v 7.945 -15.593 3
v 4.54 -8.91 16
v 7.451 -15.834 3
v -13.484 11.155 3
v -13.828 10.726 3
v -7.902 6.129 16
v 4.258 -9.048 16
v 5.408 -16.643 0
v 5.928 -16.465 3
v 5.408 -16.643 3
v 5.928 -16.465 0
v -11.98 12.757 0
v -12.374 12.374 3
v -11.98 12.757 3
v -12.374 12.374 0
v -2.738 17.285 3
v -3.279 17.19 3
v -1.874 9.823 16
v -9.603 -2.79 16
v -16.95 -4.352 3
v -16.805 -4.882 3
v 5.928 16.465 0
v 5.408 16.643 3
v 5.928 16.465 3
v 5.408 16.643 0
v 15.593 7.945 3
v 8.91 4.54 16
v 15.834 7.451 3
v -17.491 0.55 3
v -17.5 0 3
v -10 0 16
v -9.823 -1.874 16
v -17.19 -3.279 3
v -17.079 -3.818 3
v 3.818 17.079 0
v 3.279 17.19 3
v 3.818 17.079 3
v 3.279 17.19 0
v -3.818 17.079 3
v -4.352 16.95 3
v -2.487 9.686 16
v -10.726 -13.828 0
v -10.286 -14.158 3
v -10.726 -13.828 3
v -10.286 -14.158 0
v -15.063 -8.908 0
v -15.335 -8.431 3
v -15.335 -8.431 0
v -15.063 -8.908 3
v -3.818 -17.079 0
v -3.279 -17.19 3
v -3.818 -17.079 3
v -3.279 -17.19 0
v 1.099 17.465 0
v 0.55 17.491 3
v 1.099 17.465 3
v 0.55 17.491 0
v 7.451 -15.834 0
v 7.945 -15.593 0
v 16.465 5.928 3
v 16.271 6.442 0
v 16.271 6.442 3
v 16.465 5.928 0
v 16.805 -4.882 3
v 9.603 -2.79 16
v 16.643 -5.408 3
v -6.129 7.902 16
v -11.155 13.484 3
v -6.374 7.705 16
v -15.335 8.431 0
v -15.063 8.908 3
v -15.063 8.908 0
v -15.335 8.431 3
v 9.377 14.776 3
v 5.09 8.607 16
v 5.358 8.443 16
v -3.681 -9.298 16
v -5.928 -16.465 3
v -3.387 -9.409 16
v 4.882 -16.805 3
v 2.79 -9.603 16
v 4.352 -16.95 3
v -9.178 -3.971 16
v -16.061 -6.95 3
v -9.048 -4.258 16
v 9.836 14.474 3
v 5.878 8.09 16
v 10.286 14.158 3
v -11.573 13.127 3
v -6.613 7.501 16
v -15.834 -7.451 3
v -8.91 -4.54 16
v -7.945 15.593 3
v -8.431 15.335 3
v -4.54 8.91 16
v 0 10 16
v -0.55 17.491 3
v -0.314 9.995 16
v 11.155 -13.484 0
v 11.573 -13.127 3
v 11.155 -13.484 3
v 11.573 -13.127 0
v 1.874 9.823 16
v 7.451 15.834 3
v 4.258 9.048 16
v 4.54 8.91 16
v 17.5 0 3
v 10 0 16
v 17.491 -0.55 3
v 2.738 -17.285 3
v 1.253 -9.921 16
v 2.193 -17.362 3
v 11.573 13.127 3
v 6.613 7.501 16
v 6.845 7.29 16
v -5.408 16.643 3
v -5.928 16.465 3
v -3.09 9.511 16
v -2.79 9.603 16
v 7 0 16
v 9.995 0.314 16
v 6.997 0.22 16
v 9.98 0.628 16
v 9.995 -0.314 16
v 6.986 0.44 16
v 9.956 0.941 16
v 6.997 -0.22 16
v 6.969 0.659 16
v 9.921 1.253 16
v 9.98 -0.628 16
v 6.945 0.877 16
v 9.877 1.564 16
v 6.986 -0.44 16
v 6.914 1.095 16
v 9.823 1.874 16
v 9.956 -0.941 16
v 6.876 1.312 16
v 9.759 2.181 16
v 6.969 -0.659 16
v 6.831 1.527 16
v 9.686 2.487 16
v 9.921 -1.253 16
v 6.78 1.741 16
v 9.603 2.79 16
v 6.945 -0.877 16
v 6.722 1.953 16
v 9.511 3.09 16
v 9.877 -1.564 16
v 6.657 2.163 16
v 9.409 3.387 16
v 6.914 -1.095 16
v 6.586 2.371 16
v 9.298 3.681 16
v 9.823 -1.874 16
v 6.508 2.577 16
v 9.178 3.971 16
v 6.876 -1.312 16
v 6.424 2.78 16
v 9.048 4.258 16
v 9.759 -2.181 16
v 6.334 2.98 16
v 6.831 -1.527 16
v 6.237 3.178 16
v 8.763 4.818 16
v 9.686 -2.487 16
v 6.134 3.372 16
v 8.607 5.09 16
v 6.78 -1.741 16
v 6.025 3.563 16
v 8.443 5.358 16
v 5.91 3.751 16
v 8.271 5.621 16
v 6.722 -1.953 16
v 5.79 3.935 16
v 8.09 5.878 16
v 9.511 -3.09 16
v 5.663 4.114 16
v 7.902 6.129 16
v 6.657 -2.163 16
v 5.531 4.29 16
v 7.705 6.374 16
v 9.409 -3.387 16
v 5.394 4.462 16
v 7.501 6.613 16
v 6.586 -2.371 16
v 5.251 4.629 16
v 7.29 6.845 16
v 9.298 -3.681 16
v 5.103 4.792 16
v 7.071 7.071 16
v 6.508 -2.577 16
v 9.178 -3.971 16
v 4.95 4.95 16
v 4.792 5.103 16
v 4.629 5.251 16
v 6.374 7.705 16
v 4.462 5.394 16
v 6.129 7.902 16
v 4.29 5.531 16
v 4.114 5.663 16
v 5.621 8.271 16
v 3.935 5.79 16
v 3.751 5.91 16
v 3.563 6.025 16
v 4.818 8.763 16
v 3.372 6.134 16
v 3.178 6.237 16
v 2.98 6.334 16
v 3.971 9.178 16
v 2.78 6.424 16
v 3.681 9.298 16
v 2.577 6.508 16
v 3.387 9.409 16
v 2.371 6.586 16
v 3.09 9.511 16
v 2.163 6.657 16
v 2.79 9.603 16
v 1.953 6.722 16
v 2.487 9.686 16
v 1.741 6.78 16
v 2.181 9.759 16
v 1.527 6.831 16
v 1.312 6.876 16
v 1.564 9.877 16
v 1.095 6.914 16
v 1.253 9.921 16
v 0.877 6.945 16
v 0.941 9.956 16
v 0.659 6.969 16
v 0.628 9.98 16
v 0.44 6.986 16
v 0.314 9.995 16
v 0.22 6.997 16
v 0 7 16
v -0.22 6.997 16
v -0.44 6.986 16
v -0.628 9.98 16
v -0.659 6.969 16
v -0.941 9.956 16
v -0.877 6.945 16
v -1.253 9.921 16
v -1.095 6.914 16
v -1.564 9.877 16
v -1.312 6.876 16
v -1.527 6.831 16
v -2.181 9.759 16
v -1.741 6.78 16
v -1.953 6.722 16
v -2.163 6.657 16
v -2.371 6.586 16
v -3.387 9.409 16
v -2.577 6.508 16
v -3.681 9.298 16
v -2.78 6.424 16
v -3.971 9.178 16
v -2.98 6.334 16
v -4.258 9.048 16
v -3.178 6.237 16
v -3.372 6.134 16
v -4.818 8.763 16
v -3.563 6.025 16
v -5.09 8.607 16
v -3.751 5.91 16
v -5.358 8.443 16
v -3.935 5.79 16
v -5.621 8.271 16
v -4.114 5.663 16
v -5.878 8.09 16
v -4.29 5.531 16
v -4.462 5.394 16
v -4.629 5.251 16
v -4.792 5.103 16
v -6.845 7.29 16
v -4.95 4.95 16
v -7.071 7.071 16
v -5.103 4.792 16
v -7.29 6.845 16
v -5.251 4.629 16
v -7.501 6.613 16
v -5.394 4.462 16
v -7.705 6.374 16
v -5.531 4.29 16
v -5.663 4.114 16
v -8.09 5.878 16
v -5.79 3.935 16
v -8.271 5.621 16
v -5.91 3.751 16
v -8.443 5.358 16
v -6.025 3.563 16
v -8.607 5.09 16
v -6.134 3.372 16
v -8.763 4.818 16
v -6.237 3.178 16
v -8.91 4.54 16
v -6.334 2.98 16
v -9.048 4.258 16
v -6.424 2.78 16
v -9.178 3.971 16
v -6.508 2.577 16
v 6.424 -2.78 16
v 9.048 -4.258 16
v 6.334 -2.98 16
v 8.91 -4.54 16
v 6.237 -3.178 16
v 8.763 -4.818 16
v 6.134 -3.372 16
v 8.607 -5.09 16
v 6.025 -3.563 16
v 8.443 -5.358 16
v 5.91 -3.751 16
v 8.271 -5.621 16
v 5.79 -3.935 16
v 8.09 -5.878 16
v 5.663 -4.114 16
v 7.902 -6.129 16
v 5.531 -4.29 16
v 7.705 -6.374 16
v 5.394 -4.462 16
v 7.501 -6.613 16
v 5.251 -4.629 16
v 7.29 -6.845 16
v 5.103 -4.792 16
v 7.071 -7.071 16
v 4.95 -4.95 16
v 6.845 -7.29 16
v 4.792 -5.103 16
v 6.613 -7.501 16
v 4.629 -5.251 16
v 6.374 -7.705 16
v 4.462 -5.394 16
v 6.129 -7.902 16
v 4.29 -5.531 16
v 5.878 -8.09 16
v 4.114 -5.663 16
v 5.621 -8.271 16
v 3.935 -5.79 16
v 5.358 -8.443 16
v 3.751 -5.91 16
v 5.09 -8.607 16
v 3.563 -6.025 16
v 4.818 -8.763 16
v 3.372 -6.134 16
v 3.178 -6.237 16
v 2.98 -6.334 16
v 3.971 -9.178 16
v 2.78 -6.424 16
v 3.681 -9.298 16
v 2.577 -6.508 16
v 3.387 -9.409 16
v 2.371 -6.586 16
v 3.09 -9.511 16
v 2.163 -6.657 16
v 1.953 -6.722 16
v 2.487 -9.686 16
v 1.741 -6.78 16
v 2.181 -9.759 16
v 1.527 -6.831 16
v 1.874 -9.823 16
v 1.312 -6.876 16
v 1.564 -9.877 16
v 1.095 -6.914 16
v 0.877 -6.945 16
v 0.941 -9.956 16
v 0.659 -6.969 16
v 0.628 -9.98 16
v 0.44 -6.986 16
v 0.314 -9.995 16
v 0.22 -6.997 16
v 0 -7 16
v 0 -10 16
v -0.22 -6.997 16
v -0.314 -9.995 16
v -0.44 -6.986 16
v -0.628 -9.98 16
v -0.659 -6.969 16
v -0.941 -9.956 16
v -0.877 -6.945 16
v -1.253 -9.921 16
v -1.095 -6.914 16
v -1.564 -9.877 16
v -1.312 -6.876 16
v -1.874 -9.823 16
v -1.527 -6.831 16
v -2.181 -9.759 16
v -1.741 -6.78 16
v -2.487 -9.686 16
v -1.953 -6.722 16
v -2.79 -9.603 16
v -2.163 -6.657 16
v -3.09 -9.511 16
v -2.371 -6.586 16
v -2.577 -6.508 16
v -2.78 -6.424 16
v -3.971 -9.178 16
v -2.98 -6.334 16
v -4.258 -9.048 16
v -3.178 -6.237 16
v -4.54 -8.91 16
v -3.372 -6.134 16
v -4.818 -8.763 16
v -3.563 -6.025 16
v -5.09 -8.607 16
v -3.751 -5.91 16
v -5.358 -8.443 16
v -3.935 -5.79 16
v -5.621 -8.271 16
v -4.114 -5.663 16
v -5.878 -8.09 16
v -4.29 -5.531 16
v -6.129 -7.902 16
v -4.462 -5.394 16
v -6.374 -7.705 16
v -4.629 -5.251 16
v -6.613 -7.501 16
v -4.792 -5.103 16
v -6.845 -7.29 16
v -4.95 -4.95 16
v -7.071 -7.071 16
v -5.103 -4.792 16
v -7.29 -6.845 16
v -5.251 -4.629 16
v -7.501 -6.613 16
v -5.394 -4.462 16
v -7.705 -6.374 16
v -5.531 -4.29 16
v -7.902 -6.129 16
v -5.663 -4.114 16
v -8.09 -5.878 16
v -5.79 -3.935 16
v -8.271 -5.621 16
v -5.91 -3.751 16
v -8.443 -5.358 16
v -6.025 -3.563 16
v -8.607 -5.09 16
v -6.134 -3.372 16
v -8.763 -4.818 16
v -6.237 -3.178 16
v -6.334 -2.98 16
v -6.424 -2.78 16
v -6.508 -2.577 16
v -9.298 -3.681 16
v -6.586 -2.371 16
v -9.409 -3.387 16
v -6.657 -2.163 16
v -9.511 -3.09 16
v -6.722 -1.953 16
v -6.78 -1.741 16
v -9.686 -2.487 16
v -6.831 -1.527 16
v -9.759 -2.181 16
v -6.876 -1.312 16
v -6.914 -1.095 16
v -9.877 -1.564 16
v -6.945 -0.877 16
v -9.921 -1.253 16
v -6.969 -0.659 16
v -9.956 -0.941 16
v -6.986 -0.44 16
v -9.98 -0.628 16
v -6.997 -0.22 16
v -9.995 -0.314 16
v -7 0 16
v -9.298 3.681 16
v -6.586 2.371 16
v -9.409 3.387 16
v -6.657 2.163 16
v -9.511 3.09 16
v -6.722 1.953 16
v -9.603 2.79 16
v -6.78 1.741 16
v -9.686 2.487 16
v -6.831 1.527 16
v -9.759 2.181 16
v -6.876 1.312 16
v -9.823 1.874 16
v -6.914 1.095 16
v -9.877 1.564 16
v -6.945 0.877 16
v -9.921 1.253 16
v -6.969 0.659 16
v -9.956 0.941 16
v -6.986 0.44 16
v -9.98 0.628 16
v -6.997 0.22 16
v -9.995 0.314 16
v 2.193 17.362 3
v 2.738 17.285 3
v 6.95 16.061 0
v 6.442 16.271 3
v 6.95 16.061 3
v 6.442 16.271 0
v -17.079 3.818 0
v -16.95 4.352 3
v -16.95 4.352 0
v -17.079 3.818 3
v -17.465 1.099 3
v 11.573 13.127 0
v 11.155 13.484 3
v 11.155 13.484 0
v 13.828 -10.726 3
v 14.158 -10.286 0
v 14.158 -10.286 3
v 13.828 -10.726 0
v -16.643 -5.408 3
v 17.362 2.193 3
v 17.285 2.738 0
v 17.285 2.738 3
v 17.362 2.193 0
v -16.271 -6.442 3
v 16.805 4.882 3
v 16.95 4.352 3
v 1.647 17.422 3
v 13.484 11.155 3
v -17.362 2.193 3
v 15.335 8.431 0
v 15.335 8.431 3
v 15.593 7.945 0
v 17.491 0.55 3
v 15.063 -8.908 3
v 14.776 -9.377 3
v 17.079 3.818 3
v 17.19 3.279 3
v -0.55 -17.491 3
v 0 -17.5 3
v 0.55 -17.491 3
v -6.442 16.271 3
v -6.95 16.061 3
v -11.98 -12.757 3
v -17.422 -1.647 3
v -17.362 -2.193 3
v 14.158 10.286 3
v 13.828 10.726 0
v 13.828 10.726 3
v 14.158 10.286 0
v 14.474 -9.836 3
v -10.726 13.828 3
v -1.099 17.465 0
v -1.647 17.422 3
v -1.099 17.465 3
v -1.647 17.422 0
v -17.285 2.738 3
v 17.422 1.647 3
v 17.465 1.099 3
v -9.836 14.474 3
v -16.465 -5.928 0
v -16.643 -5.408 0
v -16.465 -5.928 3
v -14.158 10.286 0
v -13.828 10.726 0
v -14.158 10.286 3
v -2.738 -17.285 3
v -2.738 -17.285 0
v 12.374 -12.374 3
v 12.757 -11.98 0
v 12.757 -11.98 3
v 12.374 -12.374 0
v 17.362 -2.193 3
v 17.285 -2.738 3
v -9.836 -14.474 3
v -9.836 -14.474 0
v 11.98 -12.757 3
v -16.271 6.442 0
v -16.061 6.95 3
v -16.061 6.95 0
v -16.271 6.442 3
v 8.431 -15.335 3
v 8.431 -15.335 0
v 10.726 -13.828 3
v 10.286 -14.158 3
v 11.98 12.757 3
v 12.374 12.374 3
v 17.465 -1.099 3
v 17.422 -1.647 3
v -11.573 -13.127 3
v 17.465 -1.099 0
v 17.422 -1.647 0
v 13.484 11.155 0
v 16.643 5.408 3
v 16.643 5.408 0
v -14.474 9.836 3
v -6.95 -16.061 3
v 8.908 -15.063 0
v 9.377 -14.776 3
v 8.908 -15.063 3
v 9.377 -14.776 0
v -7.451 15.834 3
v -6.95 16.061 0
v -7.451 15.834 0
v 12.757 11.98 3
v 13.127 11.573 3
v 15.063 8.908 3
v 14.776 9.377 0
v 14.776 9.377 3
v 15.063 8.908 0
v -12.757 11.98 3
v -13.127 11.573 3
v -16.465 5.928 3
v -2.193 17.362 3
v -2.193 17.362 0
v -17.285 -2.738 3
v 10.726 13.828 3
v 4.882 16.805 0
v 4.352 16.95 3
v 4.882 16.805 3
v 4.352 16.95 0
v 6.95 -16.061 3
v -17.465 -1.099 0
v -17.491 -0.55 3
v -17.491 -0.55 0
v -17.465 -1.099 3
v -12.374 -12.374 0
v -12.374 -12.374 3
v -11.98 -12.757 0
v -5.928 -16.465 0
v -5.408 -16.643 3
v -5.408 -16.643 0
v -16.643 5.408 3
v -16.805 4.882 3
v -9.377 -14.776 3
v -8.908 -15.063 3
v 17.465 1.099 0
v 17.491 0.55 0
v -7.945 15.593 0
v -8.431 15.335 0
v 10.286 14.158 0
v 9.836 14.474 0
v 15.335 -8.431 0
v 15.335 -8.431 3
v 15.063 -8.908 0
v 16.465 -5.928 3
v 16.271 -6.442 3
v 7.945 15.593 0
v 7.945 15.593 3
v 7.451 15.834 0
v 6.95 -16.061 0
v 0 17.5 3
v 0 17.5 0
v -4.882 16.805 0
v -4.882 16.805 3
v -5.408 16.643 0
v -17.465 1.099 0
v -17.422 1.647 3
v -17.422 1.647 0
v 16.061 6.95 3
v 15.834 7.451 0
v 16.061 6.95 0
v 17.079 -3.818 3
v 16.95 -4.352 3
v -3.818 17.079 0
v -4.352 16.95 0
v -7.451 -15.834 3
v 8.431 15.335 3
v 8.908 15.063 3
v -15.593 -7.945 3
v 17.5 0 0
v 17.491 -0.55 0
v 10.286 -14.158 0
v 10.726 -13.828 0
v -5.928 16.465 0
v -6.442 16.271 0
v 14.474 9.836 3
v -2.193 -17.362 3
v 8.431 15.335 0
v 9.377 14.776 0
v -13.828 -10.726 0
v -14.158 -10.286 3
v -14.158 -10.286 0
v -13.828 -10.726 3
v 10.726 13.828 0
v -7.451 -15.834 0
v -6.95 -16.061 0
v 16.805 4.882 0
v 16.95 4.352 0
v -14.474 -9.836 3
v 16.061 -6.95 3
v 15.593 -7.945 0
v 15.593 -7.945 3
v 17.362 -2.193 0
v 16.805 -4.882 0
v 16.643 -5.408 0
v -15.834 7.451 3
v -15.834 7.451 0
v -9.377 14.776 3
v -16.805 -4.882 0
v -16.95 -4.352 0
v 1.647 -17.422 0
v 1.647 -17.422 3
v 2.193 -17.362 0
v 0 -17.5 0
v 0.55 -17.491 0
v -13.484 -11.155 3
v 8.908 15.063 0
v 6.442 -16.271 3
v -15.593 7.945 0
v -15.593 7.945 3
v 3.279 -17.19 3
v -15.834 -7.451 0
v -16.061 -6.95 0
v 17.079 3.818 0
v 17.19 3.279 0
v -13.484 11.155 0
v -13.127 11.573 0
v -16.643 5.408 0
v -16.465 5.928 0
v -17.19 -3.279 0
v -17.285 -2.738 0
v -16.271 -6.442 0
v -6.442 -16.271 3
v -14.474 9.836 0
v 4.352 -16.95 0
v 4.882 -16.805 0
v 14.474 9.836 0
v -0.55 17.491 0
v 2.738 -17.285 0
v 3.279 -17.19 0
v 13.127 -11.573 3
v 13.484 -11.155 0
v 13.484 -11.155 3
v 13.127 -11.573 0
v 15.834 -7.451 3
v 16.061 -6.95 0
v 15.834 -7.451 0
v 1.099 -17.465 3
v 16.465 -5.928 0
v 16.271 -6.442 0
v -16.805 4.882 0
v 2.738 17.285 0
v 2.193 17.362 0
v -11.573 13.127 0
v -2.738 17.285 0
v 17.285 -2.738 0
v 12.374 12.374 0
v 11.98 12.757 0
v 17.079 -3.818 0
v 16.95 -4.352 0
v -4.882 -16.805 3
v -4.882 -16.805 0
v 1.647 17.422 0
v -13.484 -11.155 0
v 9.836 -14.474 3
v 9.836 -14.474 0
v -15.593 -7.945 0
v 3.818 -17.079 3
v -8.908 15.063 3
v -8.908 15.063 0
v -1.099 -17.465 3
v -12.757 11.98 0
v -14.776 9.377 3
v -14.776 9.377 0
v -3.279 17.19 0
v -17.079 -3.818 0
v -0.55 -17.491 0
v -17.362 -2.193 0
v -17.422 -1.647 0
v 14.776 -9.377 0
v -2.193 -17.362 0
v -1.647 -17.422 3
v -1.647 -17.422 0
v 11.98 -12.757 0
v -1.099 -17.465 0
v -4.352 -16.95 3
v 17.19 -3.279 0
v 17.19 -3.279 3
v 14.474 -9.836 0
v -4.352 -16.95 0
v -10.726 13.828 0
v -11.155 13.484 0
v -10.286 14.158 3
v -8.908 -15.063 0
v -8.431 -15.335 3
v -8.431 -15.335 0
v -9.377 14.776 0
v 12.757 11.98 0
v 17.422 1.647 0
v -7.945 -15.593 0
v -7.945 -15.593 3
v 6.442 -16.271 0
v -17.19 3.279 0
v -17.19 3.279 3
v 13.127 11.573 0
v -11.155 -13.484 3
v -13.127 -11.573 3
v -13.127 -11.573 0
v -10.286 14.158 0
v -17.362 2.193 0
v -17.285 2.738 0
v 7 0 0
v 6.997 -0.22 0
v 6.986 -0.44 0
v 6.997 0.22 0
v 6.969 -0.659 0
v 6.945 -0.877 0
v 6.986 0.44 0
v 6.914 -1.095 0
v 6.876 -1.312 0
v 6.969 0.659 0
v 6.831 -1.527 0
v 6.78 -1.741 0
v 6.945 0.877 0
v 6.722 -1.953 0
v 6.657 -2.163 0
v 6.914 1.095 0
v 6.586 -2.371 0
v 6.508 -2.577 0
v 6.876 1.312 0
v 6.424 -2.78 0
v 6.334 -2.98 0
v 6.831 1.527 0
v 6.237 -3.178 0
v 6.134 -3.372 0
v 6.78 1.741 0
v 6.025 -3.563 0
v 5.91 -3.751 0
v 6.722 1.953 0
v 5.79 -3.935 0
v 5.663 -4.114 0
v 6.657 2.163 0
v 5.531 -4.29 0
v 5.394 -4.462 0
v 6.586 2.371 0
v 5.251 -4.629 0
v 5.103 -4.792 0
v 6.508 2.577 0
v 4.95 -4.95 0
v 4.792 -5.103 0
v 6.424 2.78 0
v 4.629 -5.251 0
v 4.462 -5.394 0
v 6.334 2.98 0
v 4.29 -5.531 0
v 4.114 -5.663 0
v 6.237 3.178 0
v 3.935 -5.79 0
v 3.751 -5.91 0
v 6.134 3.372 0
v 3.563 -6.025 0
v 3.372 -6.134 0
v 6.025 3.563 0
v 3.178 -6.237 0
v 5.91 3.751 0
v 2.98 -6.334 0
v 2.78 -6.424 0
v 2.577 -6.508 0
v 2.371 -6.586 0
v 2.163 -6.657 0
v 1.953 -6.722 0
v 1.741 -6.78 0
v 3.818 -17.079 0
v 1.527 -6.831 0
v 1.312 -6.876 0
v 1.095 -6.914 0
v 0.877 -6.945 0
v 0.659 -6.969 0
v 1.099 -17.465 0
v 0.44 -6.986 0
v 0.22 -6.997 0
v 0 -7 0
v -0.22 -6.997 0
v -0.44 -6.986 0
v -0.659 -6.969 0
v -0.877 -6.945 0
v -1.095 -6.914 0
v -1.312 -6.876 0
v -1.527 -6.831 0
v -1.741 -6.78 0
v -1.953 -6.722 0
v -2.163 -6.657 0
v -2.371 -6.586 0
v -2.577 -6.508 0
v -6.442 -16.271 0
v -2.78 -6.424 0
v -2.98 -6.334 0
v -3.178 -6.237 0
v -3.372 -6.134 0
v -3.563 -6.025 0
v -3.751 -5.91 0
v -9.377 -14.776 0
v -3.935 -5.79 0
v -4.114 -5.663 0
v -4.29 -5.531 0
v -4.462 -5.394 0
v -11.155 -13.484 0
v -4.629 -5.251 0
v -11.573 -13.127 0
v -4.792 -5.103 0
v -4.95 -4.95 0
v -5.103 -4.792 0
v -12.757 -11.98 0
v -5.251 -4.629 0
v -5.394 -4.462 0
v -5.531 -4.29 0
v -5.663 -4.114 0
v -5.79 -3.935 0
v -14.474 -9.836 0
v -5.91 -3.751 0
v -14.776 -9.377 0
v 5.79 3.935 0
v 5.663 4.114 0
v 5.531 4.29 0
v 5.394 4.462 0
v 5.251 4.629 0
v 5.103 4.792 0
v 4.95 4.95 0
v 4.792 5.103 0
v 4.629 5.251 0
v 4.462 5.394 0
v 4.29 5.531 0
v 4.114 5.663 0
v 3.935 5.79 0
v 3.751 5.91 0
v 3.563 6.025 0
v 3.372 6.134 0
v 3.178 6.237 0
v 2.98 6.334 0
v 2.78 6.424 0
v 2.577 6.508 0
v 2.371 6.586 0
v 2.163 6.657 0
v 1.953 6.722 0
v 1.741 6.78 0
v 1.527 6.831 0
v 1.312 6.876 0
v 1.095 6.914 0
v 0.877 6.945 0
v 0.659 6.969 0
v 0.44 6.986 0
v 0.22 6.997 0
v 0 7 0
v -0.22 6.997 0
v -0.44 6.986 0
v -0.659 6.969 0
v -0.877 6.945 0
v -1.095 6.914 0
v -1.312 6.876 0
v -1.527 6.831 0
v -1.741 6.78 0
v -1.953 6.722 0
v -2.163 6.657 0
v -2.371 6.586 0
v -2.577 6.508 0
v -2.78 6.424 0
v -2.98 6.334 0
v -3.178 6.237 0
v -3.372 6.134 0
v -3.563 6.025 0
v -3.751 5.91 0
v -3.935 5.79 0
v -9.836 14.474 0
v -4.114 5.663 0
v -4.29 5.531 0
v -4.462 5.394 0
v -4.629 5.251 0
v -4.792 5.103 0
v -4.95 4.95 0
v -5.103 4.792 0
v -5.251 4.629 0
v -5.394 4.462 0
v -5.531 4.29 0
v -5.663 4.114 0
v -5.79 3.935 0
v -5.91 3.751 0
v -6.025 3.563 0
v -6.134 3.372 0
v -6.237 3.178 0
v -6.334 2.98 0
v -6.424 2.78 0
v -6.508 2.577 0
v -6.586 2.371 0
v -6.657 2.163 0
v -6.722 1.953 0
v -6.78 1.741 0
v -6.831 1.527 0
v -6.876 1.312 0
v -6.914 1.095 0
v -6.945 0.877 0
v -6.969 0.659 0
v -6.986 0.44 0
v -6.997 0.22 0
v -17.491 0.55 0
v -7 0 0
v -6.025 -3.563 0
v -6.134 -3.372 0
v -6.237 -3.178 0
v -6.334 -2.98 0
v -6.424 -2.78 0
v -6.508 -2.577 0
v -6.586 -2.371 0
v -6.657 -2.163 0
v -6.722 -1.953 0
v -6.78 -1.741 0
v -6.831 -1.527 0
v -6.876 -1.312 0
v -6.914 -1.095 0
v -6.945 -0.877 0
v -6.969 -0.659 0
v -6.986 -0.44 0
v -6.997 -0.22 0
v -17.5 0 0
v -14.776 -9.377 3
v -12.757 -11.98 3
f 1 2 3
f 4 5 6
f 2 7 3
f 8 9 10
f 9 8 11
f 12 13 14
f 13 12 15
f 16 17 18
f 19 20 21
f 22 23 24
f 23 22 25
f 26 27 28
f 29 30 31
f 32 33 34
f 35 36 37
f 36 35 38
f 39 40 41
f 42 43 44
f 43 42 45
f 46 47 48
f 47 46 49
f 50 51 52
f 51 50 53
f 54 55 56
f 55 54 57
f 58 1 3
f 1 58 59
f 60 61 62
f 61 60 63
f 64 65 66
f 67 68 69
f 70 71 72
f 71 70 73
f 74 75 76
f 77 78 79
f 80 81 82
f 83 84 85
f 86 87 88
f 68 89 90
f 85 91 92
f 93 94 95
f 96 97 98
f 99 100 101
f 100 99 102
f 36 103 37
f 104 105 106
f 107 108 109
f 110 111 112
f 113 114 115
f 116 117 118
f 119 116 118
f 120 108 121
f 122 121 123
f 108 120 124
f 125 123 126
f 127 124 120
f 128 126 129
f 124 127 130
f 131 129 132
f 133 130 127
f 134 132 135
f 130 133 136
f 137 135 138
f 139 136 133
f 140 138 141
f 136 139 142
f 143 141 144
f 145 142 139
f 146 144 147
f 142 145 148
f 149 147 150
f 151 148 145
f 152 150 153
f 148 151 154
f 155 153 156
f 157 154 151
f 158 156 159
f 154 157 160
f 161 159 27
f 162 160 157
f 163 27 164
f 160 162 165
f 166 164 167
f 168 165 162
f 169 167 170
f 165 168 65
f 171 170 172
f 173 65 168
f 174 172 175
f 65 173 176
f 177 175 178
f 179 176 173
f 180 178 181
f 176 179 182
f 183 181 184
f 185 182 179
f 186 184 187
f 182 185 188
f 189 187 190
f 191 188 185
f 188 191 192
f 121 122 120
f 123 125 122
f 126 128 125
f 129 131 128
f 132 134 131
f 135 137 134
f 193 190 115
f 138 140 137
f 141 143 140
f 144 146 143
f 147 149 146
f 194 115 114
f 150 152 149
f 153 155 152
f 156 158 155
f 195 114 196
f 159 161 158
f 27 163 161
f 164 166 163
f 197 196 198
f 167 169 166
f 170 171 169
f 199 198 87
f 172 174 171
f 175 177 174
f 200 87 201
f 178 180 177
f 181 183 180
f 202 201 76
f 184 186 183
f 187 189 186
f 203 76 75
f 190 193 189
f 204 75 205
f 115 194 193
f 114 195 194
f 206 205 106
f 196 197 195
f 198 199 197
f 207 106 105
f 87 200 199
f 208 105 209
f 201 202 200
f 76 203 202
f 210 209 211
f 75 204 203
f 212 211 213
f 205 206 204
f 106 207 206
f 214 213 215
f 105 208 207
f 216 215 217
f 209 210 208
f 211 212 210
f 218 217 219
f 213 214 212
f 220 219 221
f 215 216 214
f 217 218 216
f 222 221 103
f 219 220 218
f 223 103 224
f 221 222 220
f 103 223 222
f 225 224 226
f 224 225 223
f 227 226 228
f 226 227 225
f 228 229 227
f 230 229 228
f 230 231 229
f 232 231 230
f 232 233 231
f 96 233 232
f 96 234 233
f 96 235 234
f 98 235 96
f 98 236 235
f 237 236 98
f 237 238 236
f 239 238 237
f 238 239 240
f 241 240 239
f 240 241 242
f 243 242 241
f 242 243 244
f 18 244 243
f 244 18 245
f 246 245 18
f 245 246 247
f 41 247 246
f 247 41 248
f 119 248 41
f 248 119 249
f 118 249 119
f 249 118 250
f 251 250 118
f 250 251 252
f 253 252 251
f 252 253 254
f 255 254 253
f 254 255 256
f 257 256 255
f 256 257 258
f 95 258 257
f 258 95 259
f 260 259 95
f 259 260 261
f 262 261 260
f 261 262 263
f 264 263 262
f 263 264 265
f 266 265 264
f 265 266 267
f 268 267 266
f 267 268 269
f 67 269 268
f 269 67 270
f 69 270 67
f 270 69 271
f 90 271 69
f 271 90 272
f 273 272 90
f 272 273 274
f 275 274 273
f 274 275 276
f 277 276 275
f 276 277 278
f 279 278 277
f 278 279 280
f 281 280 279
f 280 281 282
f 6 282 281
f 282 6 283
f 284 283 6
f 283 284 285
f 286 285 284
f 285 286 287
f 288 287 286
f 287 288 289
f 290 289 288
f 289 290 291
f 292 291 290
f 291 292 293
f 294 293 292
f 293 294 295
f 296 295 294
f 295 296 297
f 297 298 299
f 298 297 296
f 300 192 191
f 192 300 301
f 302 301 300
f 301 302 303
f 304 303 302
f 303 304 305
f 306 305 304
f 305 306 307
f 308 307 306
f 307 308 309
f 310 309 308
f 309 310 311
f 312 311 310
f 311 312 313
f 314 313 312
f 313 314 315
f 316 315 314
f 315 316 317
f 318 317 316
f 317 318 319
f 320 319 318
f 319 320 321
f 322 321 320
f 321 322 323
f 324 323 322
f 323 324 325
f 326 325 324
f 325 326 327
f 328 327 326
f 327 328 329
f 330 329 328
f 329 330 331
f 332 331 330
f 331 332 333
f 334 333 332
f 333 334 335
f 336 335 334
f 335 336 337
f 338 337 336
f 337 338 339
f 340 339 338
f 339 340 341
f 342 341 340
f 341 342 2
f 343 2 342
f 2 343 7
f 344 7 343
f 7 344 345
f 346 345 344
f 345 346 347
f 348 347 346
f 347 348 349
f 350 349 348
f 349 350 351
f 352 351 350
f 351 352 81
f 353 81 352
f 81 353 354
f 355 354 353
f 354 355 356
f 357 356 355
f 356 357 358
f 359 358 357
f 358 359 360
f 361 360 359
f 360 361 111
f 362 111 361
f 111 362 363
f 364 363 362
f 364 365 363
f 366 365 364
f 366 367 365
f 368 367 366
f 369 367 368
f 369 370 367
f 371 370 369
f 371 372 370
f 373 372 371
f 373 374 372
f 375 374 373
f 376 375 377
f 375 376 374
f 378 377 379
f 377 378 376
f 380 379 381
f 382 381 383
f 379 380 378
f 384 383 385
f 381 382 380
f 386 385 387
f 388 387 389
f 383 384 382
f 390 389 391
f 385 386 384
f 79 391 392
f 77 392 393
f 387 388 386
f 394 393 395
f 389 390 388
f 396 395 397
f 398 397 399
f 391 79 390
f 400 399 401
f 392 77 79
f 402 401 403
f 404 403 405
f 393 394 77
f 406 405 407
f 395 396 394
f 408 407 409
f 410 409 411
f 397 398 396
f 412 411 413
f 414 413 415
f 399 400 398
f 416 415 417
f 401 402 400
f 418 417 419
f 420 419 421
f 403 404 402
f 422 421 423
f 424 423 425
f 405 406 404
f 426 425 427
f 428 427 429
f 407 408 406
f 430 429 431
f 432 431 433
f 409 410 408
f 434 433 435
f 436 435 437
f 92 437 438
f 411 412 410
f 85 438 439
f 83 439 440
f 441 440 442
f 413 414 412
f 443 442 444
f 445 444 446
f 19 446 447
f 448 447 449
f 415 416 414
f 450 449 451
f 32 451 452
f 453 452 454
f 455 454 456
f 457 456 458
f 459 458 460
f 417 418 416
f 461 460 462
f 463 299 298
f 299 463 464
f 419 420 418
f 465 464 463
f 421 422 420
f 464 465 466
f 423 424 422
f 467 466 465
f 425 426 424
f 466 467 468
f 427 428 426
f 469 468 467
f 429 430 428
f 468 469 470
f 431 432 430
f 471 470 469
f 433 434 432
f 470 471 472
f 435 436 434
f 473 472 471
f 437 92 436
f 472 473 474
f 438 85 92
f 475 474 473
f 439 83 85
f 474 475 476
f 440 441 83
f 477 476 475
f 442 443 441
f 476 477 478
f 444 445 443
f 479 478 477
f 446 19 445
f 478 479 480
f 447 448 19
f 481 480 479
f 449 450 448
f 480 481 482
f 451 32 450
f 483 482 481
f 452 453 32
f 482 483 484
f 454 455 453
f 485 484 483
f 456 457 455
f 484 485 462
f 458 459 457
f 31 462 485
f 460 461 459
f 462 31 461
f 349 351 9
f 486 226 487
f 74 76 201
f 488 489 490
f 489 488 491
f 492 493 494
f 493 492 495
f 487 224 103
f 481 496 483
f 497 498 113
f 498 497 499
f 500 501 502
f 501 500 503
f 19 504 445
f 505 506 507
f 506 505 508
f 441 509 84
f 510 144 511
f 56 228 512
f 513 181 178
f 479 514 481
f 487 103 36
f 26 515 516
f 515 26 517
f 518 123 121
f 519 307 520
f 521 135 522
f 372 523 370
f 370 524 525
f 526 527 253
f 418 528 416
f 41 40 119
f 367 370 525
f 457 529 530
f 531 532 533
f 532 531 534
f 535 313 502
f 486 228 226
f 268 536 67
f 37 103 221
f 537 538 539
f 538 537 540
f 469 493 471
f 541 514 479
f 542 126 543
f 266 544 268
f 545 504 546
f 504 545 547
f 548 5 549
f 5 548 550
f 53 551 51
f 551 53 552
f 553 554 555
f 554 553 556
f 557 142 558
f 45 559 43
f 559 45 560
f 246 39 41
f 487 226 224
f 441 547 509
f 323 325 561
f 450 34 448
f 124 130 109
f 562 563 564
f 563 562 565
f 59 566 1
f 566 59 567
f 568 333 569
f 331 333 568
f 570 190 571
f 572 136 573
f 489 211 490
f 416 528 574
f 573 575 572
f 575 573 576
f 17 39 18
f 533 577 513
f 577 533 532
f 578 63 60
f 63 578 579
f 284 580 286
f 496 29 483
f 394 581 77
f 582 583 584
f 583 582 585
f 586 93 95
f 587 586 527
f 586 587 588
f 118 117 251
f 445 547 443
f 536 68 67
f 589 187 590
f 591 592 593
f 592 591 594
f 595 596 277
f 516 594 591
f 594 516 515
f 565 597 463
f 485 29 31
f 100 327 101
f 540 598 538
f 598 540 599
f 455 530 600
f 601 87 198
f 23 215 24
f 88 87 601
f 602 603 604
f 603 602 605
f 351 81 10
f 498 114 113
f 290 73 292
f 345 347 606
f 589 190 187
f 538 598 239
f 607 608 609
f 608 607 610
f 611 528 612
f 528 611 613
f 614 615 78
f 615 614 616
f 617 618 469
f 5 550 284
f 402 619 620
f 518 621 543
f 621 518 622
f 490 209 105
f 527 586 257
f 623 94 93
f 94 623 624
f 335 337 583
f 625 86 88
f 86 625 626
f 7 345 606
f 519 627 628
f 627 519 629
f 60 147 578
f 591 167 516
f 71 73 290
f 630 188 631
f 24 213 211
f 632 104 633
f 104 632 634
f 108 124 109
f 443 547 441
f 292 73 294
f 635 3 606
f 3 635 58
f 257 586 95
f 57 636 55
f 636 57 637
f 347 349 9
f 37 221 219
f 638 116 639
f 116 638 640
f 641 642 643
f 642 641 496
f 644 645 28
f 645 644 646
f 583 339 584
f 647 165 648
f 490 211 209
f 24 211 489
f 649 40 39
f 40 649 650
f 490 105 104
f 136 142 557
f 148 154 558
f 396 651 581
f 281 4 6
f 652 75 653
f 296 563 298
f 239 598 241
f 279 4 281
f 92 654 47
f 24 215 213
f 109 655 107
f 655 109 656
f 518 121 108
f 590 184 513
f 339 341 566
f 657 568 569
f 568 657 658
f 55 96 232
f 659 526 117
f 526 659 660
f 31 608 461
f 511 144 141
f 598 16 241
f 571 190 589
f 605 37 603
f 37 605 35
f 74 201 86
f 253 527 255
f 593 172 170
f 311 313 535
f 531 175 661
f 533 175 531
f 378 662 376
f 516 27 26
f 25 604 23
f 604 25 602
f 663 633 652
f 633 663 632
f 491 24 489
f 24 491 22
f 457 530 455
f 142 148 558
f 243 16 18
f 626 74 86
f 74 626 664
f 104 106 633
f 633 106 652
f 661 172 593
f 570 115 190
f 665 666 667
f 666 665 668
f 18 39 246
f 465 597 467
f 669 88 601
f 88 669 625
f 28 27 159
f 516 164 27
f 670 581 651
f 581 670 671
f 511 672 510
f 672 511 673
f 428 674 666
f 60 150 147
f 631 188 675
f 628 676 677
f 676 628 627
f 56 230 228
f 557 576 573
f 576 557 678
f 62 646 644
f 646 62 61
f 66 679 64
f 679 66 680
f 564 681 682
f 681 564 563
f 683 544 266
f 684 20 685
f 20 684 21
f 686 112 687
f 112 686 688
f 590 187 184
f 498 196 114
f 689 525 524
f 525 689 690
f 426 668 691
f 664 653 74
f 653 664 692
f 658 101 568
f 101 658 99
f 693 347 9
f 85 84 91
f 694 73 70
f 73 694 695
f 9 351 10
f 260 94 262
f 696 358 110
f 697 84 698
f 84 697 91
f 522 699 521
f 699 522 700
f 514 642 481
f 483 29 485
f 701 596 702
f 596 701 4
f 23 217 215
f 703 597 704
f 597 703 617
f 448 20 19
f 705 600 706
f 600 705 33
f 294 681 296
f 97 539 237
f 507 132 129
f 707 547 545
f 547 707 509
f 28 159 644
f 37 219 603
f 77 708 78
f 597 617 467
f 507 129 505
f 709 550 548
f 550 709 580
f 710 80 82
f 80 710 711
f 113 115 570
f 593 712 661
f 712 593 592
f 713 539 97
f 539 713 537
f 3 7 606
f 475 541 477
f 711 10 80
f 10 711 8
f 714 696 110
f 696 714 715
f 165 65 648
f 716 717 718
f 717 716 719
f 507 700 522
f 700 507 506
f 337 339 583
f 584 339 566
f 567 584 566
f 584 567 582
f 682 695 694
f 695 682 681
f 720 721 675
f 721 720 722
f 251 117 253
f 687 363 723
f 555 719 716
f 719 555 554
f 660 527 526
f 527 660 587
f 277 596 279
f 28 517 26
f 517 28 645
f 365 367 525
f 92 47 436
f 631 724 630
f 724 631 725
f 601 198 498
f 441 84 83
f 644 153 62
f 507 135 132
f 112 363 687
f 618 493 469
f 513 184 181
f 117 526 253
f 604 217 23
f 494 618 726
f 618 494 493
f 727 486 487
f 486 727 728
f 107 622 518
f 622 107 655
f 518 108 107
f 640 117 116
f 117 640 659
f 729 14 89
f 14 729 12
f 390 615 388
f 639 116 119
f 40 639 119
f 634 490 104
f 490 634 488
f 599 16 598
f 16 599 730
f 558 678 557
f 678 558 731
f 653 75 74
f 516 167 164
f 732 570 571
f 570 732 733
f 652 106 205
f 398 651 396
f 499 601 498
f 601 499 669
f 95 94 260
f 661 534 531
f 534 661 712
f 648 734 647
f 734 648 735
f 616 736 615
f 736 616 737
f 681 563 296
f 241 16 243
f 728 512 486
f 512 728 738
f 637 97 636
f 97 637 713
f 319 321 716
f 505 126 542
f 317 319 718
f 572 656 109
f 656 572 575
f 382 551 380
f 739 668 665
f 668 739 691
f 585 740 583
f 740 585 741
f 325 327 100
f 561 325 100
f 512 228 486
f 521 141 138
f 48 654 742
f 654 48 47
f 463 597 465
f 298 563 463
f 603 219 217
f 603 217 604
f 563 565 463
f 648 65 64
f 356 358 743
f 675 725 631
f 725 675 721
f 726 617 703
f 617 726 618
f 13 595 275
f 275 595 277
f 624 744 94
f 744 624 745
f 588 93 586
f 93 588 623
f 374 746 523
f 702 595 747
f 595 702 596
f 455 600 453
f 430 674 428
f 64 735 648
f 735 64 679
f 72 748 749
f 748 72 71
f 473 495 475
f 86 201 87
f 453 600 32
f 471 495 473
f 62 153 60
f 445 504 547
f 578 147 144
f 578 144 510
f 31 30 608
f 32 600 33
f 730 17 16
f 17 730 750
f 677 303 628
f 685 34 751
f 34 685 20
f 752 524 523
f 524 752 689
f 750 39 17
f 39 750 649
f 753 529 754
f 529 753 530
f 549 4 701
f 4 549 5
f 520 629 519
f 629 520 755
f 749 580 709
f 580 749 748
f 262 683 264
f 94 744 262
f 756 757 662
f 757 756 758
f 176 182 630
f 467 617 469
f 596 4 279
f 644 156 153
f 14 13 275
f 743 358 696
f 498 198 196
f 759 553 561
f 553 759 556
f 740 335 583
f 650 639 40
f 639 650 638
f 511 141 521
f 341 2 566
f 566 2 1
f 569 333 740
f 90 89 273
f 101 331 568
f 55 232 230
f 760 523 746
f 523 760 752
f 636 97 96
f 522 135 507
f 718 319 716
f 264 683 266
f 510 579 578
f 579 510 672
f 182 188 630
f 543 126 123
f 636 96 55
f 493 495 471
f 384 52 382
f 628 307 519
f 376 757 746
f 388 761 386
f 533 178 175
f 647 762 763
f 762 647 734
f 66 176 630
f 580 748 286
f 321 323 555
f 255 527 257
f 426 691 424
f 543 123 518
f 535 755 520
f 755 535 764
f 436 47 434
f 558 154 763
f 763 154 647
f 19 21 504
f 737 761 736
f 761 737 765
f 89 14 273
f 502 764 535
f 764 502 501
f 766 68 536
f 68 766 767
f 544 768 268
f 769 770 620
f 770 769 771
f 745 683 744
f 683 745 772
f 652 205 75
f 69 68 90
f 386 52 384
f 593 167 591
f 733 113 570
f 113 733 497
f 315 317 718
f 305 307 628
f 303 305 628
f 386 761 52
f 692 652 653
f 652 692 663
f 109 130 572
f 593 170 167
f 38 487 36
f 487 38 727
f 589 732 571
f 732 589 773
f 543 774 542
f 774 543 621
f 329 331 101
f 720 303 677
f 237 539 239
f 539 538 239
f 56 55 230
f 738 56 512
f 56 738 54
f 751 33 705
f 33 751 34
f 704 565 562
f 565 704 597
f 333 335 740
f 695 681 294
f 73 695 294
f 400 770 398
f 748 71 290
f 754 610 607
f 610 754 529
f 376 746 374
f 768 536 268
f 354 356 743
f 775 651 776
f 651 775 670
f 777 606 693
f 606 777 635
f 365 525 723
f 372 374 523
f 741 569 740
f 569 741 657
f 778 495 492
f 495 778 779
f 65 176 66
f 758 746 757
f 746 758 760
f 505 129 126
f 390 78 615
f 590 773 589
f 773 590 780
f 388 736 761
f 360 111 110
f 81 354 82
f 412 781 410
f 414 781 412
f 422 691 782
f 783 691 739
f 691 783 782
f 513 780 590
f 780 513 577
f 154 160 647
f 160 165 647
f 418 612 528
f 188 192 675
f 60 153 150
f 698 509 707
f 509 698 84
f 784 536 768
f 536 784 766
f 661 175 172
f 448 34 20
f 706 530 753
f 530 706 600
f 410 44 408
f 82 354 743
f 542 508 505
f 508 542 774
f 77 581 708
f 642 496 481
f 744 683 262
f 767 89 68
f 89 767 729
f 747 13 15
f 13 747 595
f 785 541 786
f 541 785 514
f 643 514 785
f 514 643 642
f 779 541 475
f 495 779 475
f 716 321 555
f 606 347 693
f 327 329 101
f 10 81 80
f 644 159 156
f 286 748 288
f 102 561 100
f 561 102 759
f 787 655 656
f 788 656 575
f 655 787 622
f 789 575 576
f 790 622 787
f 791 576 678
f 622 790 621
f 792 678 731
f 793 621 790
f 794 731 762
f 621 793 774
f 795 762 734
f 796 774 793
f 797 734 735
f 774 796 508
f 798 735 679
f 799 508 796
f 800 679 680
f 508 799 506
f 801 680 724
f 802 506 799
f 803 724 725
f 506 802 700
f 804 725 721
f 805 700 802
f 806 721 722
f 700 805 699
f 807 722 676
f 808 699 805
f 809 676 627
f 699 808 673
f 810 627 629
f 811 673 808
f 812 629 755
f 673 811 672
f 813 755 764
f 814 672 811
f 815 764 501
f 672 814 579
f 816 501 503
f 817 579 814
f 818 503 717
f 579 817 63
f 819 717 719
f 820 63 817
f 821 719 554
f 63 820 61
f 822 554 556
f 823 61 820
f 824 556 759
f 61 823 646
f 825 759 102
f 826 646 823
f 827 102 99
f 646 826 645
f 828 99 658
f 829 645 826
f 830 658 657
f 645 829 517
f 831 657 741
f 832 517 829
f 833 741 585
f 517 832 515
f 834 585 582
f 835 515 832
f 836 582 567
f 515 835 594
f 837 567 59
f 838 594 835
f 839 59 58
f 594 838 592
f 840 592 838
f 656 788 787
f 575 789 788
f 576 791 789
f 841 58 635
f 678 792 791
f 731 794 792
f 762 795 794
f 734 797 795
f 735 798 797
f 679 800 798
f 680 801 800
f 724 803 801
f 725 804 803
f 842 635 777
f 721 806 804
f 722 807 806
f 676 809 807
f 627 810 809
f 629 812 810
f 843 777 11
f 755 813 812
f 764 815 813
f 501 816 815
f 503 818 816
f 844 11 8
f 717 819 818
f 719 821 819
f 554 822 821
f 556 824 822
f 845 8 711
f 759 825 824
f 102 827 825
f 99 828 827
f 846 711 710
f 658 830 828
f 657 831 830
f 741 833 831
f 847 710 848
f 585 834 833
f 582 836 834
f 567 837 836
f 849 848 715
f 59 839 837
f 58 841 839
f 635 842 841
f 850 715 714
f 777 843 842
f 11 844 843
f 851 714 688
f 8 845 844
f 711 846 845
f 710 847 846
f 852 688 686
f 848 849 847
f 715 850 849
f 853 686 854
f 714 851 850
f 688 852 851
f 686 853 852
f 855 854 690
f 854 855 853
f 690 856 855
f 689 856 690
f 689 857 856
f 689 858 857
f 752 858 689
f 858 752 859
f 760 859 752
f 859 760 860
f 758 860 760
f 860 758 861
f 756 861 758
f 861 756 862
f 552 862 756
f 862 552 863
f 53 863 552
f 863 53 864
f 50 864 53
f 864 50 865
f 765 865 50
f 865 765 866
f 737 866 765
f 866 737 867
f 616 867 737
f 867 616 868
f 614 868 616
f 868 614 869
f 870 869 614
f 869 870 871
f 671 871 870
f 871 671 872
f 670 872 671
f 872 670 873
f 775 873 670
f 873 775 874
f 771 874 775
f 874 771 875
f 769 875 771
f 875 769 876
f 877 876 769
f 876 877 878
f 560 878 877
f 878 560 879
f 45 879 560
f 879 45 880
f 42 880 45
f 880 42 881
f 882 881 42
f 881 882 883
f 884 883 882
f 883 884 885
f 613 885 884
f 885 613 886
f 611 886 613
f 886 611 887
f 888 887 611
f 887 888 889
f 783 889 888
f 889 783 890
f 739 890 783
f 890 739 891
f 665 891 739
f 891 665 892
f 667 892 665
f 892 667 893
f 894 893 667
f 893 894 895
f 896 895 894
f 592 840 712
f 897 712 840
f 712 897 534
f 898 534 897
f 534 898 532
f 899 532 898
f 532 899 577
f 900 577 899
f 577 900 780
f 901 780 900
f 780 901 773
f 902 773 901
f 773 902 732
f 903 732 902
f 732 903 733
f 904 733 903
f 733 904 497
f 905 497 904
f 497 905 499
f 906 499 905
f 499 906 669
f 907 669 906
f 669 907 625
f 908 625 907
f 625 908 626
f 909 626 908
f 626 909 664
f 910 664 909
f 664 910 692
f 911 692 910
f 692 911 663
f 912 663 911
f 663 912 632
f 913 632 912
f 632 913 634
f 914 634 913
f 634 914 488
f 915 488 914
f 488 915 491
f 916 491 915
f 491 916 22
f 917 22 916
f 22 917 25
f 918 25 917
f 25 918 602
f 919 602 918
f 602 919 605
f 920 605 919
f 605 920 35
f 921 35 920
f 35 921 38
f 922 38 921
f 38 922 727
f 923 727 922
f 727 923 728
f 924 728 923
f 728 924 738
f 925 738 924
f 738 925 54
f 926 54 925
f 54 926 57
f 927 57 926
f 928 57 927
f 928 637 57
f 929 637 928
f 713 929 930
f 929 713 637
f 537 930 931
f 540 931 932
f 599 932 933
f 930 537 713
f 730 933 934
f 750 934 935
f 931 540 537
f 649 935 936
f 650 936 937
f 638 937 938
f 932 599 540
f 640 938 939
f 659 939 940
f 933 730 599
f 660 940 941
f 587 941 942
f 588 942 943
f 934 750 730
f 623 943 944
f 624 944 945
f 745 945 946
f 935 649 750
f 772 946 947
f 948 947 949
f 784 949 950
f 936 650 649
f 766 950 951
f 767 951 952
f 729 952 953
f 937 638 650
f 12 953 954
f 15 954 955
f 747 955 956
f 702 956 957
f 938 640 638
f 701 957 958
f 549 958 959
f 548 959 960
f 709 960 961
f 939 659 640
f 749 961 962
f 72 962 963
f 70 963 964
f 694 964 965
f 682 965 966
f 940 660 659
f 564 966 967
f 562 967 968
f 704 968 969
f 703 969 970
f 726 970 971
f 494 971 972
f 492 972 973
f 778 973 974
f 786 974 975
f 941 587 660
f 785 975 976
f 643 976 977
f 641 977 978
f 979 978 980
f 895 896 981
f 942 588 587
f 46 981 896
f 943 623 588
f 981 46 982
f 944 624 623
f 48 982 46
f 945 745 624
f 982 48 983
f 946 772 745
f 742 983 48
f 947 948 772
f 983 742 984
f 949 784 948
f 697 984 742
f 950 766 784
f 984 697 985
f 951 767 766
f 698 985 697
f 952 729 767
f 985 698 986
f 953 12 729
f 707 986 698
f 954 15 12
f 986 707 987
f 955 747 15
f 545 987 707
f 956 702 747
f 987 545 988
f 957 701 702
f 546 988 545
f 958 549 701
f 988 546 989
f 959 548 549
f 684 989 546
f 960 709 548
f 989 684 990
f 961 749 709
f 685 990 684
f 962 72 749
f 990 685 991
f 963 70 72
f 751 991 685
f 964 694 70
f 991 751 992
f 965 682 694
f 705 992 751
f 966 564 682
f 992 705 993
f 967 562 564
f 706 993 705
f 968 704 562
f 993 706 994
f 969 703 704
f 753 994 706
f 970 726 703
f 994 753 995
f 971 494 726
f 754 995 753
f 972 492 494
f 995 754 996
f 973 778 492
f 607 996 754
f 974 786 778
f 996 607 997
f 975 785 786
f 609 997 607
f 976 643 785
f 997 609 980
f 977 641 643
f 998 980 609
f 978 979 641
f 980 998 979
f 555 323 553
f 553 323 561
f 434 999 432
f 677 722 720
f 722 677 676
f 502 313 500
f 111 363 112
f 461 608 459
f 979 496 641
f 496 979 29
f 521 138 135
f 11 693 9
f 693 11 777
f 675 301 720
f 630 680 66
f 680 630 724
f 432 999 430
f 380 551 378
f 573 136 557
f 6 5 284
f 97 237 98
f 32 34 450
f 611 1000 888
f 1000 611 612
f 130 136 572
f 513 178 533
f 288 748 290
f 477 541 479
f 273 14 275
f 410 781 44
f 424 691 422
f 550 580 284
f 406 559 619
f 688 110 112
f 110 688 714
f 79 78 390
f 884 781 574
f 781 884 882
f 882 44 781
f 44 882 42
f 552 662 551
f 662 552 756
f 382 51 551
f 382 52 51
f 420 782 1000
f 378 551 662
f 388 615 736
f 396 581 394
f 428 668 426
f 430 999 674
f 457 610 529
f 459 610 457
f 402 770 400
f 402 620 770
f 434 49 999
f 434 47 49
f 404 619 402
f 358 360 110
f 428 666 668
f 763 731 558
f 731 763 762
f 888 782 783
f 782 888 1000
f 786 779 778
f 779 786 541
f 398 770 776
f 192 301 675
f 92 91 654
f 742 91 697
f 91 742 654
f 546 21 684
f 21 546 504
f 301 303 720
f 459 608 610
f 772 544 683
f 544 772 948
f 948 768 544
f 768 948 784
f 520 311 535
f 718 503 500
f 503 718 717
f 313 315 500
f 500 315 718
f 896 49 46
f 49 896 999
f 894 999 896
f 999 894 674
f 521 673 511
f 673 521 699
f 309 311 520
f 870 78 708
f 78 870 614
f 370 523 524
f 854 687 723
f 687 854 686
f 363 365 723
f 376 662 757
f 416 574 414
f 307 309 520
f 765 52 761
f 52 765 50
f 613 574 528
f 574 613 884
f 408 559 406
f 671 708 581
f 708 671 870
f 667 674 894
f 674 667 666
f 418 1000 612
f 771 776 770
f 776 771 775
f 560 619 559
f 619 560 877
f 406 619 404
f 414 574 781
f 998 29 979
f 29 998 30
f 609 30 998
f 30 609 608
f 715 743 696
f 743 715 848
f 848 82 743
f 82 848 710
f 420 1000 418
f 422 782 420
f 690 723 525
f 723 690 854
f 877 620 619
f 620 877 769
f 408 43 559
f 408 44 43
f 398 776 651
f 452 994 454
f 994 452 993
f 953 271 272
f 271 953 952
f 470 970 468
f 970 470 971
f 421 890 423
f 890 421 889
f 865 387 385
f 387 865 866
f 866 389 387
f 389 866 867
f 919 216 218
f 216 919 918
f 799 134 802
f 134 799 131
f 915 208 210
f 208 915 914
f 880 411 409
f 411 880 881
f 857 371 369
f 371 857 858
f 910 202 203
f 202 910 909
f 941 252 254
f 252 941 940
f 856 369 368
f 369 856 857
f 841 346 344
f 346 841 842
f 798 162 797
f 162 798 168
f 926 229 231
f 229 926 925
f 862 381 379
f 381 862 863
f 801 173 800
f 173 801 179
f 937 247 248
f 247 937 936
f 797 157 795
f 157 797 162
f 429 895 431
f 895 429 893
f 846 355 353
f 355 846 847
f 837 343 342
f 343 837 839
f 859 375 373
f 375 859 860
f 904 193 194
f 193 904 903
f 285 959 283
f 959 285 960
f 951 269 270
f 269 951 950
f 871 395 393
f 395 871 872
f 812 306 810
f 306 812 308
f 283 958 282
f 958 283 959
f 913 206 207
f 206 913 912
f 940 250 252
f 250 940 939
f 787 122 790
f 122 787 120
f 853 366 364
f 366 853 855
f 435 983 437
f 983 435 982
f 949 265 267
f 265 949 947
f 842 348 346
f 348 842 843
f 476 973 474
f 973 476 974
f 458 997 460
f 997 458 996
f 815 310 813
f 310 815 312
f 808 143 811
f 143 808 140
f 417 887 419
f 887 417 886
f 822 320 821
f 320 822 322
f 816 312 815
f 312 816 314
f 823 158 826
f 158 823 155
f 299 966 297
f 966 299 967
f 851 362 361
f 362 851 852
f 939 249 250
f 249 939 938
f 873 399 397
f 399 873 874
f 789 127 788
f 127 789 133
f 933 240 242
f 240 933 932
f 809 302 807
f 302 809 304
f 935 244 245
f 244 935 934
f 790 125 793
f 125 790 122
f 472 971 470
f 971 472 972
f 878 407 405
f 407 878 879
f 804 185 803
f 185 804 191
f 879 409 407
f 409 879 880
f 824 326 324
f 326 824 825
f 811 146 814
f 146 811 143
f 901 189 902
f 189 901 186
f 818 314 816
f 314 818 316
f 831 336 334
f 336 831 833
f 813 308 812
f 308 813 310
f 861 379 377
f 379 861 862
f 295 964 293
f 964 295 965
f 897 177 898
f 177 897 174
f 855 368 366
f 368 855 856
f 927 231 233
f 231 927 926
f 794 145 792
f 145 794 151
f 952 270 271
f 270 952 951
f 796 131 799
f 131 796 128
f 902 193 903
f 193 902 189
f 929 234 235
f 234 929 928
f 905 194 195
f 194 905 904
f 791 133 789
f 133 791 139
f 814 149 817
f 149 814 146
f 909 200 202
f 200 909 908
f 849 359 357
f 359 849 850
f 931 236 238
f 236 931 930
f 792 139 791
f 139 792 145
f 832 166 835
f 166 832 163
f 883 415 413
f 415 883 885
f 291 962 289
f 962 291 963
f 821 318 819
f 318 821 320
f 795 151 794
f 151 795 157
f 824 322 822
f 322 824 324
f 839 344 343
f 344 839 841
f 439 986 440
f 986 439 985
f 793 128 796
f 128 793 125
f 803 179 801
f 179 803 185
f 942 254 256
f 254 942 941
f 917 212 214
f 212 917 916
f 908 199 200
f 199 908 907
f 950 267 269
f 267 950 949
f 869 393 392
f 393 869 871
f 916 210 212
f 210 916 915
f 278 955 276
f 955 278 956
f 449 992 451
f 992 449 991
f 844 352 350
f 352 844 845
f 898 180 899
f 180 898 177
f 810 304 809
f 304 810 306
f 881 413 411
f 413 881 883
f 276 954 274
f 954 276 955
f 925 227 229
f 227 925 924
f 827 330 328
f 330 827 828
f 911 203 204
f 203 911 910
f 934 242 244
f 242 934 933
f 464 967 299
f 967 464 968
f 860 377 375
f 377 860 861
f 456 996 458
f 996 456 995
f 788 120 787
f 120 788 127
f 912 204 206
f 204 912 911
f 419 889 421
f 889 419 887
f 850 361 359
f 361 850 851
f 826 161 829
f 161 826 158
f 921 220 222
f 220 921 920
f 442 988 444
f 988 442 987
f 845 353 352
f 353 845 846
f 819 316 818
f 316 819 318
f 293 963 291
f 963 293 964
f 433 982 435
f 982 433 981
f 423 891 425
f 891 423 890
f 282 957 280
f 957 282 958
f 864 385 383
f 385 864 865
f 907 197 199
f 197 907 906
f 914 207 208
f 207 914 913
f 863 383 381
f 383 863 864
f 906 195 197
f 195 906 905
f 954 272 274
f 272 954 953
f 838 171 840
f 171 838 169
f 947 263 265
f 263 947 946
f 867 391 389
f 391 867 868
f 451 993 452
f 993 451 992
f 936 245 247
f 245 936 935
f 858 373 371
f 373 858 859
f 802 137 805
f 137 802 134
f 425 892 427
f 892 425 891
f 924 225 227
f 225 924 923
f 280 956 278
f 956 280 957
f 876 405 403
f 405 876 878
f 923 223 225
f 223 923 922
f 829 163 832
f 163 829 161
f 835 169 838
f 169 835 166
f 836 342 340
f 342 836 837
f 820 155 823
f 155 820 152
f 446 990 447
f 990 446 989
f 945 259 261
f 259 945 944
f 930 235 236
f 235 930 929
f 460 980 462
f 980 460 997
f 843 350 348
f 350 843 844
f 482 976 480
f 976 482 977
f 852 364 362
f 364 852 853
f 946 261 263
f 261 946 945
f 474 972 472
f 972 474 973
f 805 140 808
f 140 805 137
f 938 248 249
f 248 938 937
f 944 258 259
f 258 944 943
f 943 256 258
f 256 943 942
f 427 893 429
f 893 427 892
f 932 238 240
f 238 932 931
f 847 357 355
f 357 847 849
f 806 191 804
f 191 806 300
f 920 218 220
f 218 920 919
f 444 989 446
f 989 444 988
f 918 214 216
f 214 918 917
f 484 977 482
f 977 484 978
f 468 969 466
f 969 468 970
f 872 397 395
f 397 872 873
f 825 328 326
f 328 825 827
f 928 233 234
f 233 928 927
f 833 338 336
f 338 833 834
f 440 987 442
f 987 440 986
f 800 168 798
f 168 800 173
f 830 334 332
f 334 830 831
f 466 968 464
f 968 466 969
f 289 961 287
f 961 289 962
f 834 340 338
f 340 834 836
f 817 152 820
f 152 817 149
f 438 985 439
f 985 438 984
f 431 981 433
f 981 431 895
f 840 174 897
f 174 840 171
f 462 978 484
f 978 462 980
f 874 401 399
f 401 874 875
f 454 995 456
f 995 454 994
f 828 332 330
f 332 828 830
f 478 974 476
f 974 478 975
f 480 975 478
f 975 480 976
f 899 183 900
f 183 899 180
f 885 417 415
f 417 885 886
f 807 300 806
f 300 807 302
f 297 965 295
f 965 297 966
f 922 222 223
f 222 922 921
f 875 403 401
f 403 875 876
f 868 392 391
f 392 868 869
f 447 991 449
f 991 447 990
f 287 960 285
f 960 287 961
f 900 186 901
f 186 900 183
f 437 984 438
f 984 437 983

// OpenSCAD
h=16;
bar=14;
outer_d=35;

base_lip=3;
top_lip=base_lip;

inner_d=bar+top_lip*2;

pad=0.1;
$fn=200;

difference() {
    hull() {
        cylinder(d=inner_d,h=h);
        cylinder(d=outer_d,h=base_lip);
    }
    translate([0,0,-pad])
    cylinder(d=bar,h=h+pad*2);

}
